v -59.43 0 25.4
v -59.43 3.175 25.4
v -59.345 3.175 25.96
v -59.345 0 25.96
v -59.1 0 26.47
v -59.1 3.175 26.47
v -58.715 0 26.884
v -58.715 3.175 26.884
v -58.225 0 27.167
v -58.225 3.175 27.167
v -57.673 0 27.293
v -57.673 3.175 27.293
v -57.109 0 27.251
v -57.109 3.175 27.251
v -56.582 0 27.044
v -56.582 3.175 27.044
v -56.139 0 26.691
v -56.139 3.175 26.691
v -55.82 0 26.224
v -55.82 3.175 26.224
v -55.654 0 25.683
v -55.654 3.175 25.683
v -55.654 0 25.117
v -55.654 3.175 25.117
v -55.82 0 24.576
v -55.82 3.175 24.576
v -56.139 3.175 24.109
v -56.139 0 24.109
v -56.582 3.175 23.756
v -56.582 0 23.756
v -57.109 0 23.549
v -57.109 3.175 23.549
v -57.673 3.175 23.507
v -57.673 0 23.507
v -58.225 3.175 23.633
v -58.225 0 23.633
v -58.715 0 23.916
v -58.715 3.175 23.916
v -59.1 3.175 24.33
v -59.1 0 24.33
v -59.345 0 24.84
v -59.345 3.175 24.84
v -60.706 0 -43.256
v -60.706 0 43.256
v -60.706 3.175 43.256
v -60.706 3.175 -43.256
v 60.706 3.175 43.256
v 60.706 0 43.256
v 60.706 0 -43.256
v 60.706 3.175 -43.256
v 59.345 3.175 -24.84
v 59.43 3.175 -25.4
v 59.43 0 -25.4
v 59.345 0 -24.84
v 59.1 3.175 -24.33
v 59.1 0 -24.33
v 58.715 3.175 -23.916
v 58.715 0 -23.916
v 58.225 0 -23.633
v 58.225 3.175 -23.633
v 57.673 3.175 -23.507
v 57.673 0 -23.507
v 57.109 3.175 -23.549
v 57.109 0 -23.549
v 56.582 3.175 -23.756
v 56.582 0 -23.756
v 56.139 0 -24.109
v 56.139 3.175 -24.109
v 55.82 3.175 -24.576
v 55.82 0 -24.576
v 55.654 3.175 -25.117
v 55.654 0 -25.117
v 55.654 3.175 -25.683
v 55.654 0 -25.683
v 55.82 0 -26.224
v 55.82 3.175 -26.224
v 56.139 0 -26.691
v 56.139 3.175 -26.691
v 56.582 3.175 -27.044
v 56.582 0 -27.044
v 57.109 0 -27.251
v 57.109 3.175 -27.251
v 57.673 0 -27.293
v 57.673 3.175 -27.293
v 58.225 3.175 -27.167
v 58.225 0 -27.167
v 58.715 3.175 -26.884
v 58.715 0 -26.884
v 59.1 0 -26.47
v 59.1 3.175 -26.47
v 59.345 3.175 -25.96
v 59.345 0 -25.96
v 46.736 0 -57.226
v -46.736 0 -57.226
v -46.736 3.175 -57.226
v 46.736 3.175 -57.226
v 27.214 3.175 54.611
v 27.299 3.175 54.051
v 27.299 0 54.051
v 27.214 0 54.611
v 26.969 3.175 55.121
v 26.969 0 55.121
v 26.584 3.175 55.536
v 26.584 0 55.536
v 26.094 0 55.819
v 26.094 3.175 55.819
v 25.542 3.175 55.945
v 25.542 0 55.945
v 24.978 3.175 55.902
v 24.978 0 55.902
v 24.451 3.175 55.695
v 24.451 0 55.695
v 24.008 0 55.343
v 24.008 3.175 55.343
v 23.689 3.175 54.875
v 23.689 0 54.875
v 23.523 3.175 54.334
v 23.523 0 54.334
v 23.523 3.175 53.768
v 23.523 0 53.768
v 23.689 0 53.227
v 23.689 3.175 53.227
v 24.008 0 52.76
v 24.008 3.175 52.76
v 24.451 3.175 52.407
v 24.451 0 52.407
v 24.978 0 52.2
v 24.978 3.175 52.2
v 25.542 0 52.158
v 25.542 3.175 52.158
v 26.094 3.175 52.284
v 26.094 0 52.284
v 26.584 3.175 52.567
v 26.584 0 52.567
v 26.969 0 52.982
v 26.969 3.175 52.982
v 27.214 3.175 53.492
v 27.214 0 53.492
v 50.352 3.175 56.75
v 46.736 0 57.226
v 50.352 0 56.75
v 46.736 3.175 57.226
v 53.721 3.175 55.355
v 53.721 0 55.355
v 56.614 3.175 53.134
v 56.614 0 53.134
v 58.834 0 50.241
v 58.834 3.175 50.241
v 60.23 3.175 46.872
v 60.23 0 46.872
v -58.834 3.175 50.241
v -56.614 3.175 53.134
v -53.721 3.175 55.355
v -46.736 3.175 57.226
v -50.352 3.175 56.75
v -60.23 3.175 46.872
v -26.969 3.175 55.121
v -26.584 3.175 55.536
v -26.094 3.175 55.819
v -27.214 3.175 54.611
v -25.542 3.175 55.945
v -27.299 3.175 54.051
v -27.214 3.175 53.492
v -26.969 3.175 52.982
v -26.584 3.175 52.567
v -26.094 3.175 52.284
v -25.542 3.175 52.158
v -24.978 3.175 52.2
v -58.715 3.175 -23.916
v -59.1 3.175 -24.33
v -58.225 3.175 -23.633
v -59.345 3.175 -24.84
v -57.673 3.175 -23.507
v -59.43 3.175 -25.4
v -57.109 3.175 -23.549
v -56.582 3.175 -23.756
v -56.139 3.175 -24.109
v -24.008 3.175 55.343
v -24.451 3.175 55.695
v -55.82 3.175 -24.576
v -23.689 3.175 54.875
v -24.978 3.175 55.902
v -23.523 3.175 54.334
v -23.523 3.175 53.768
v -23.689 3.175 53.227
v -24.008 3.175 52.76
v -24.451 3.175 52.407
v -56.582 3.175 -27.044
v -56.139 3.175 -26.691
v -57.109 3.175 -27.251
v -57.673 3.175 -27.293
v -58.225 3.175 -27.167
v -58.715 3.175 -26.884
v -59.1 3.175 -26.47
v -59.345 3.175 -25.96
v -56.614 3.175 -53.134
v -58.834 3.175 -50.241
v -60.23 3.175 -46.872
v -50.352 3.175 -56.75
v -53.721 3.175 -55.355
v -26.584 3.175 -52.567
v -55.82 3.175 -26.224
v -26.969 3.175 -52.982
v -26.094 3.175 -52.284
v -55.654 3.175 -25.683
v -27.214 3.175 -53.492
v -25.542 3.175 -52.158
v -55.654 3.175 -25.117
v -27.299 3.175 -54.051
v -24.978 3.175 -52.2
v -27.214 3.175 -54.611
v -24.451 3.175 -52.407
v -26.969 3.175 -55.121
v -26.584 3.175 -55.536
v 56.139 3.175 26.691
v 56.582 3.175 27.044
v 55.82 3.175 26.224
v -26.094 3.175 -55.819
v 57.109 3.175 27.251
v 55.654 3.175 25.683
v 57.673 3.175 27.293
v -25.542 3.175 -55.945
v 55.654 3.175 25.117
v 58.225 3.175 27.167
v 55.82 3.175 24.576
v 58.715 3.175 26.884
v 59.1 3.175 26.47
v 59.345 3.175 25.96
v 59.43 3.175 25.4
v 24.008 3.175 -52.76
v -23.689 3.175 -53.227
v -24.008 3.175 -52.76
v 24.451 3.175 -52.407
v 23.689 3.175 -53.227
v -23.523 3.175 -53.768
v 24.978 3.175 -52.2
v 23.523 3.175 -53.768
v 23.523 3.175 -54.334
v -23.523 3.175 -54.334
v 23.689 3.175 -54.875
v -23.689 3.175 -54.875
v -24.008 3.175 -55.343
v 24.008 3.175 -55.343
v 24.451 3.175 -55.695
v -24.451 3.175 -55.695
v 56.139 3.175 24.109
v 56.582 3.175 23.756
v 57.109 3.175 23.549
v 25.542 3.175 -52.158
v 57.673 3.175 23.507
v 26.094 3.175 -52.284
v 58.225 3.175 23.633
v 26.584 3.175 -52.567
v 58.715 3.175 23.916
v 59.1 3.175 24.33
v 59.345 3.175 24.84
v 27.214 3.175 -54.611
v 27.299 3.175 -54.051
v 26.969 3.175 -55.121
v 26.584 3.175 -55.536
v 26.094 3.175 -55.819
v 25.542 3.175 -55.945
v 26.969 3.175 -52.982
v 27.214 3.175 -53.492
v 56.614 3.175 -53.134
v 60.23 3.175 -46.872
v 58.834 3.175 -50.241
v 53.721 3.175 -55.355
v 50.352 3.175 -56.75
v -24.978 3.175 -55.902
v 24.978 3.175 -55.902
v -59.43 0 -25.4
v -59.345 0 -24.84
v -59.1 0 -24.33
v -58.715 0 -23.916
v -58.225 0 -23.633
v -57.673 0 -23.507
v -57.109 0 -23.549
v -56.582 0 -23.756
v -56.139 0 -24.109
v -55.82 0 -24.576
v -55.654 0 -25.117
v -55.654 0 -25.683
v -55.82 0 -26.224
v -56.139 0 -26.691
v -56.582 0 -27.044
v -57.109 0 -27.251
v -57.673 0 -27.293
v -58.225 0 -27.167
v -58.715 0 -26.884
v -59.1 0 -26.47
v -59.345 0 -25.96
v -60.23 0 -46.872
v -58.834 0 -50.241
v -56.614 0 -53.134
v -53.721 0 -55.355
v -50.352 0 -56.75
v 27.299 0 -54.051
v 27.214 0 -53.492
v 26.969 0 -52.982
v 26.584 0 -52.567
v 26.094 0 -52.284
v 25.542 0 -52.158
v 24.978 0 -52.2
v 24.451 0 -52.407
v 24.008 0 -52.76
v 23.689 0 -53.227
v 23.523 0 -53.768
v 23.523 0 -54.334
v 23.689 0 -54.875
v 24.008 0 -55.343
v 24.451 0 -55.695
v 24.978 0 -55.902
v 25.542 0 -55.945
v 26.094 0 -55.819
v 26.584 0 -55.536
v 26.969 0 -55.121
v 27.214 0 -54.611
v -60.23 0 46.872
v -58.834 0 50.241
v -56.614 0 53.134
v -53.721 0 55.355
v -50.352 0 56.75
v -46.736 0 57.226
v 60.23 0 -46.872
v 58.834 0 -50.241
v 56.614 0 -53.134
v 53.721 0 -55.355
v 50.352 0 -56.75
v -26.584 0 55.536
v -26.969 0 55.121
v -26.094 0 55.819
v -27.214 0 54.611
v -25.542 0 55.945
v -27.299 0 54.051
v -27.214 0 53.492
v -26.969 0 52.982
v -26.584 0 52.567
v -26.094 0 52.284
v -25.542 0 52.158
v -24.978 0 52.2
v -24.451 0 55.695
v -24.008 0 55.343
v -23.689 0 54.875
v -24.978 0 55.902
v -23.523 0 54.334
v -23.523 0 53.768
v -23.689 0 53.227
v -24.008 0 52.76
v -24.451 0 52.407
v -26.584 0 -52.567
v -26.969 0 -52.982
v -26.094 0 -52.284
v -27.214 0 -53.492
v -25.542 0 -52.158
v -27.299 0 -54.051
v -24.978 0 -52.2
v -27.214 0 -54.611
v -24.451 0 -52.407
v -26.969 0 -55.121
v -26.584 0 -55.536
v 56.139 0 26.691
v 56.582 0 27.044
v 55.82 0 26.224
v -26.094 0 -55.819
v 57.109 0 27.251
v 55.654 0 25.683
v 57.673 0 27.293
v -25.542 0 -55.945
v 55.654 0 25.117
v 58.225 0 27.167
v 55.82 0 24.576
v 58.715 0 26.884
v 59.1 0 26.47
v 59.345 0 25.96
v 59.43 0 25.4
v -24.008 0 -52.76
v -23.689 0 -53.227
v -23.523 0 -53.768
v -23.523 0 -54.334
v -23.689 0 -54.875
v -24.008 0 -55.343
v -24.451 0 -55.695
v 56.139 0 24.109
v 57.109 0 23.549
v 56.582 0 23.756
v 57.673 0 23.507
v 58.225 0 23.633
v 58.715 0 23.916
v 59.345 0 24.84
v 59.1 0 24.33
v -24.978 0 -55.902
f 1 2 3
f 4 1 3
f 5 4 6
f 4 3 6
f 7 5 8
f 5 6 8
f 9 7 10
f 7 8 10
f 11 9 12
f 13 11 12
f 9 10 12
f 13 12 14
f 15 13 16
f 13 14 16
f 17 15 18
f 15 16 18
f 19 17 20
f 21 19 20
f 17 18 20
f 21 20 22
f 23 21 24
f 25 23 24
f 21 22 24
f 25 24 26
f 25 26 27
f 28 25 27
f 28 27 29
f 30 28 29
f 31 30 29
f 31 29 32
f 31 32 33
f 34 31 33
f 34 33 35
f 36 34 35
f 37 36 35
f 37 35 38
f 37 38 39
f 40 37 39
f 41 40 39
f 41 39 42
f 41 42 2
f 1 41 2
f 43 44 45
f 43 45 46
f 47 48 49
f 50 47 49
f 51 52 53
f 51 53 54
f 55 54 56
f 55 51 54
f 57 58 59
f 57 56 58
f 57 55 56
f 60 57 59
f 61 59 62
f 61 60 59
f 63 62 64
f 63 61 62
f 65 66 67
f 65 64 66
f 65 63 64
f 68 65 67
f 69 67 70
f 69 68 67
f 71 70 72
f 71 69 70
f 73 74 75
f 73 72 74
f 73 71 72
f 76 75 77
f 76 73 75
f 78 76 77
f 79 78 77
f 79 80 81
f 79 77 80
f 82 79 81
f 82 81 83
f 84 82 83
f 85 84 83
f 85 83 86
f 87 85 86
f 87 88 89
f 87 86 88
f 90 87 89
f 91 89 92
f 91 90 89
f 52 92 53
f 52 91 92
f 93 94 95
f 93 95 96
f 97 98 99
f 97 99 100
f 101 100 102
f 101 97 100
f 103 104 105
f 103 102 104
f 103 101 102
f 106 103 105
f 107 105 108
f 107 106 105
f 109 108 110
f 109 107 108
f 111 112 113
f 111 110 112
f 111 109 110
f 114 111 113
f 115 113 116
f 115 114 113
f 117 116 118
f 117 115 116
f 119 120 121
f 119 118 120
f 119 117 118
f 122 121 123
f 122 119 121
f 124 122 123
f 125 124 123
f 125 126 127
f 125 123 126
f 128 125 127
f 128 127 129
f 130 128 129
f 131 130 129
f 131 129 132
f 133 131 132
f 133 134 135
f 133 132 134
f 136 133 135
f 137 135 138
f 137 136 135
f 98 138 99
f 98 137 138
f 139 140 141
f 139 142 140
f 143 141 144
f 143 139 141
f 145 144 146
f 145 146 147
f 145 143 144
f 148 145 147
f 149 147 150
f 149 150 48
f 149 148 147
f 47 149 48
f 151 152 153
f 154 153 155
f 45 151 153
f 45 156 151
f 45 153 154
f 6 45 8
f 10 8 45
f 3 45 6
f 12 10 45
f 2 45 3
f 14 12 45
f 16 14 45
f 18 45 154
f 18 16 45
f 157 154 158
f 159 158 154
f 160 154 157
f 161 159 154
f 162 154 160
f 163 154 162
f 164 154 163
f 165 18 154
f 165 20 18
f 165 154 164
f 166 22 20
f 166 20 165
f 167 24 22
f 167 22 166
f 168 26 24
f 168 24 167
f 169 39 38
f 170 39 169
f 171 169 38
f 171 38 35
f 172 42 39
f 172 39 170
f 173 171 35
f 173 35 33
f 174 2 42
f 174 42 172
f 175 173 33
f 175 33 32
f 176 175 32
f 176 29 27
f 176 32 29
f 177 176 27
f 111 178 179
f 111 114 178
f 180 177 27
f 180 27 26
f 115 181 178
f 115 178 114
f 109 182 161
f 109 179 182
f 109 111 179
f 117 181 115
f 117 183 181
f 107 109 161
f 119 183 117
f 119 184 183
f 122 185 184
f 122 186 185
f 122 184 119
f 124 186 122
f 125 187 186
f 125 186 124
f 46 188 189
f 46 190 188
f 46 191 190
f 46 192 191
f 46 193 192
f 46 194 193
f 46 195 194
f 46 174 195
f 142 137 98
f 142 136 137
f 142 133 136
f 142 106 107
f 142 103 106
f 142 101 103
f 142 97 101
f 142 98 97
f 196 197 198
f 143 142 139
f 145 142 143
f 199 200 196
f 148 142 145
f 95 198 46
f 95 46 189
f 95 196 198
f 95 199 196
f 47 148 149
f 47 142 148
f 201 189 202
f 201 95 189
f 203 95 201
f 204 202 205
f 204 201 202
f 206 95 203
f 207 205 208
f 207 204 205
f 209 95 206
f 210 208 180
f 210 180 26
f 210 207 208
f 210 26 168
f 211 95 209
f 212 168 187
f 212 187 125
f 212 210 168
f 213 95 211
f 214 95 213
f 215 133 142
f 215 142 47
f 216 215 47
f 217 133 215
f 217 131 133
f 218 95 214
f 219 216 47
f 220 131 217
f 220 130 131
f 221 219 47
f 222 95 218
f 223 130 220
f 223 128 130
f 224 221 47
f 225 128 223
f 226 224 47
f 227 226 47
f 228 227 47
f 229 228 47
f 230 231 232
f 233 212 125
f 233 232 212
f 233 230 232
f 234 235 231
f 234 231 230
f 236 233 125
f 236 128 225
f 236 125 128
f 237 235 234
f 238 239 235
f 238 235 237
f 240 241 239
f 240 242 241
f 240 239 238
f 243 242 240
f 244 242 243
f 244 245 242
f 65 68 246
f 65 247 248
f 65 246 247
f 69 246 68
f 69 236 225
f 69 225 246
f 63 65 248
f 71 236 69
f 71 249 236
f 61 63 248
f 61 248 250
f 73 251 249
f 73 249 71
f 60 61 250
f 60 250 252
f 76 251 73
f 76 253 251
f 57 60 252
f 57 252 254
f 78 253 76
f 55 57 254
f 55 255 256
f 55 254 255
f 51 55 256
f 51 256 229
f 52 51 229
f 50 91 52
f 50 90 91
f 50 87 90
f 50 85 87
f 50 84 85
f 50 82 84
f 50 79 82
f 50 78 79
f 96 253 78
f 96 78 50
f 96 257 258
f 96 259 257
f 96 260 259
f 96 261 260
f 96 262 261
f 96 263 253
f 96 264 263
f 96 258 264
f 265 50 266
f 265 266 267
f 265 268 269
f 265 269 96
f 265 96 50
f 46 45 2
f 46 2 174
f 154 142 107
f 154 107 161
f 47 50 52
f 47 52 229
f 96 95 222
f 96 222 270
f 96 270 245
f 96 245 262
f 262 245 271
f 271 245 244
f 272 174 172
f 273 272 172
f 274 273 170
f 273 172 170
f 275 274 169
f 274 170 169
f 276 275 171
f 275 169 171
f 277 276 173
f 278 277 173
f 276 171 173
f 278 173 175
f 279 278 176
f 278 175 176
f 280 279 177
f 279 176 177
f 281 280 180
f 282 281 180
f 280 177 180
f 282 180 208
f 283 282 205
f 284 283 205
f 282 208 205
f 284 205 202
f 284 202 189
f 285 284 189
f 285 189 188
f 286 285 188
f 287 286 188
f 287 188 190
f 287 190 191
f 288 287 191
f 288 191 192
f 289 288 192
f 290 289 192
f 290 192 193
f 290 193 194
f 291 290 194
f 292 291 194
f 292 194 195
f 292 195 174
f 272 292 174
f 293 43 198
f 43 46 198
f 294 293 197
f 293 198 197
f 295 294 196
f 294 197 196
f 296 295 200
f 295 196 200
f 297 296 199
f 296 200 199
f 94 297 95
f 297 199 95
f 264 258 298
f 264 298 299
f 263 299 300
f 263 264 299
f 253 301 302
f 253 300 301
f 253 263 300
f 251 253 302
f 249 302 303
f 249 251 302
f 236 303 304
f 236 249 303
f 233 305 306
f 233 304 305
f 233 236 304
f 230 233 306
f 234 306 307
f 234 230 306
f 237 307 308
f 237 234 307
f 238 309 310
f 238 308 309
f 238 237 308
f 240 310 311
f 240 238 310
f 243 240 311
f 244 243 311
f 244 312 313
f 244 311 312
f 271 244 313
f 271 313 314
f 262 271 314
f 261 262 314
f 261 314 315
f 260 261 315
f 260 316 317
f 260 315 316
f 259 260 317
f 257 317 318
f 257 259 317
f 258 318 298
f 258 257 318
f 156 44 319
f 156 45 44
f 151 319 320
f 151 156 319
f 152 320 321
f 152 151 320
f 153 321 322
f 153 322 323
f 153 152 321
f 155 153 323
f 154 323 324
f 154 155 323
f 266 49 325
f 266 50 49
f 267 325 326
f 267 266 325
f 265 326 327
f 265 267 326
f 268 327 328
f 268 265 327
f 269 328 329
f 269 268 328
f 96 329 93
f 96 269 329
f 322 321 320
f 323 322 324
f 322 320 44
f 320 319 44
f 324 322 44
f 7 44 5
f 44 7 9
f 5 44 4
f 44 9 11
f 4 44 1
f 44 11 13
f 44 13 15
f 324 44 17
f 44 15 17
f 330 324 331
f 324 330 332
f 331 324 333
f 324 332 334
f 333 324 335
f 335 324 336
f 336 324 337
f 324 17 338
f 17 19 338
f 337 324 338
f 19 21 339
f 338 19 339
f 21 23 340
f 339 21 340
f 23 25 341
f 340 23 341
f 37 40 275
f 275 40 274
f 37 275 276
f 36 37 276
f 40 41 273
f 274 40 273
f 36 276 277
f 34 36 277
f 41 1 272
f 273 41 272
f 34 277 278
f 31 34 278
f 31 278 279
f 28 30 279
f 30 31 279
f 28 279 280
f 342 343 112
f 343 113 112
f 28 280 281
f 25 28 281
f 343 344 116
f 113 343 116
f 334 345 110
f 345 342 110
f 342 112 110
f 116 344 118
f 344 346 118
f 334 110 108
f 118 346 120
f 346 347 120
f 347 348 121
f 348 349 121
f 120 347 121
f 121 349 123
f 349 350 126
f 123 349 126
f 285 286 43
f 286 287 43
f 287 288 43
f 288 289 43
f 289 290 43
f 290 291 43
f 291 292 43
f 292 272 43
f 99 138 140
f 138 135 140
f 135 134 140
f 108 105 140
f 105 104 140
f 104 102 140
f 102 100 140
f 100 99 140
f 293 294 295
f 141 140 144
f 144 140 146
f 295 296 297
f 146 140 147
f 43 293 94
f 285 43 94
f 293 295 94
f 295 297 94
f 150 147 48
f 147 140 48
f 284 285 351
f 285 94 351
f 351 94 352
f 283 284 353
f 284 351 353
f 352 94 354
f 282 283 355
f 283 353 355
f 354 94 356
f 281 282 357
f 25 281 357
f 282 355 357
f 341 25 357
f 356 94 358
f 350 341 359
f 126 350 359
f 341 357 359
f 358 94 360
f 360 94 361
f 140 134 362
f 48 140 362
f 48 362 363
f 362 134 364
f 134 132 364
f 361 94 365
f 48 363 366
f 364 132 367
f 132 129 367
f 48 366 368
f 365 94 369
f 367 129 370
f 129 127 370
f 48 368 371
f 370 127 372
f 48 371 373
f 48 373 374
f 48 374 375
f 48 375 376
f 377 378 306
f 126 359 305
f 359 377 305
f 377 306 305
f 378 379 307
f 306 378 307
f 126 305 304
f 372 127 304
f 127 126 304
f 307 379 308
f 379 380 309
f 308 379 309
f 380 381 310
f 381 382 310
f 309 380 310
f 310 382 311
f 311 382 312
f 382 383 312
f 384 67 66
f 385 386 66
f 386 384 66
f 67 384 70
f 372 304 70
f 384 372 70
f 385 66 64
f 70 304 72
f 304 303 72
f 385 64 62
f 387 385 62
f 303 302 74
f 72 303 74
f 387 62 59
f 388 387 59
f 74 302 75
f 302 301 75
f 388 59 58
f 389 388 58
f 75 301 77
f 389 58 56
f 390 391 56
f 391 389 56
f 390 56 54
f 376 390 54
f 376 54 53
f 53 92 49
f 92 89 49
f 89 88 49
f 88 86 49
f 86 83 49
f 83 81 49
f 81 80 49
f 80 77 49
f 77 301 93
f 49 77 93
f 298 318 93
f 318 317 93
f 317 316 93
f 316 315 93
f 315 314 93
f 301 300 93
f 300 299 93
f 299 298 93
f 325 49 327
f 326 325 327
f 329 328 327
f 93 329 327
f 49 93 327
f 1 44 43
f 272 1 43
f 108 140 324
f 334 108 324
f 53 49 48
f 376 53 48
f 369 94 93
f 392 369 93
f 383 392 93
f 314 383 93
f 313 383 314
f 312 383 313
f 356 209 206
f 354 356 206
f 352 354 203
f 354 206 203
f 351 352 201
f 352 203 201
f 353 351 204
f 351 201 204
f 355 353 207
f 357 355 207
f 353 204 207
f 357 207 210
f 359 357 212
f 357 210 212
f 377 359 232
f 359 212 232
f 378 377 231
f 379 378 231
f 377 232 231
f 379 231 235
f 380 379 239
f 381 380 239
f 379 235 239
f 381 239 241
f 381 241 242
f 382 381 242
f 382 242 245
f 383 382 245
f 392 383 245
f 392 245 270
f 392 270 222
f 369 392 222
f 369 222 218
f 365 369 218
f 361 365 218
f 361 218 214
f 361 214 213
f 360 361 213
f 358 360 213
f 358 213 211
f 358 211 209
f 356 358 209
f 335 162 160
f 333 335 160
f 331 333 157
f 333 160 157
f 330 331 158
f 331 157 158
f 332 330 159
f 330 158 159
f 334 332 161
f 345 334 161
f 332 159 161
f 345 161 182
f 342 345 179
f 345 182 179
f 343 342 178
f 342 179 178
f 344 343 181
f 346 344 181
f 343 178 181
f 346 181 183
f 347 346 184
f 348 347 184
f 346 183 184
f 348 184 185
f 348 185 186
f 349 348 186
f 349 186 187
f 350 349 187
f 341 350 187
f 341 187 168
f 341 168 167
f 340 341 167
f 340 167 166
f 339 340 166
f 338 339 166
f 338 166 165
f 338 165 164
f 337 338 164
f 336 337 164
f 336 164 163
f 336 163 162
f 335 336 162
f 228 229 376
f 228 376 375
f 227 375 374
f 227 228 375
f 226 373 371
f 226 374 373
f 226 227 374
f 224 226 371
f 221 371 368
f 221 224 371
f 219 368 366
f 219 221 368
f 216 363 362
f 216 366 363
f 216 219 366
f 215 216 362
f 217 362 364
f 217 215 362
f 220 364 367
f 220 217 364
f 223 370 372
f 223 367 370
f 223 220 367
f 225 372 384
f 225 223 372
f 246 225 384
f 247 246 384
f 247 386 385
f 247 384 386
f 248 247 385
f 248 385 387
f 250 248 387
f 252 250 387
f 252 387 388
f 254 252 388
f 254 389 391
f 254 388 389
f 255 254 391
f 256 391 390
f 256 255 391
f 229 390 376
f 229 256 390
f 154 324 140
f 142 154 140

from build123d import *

# Parameters (mm, degrees)
SKETCH1_W             = 121.412
SKETCH1_H             = 114.4524
BOSS_EXTRUDE1_DEPTH   = 3.175
FILLET2_R             = 13.97
F_6_CLEARANCE_HOLE1_D = 3.7973


with BuildPart() as part:
    # Sketch1 → Boss-Extrude1 (new body)
    with BuildSketch(Plane(origin=(0, 0, 0), x_dir=(1, 0, 0), z_dir=(0, 1, 0))):
        Rectangle(SKETCH1_W, SKETCH1_H)
    extrude(amount=BOSS_EXTRUDE1_DEPTH)

    # Fillet2
    fillet2_edges = [part.edges().sort_by_distance(p)[0] for p in [
        (-60.706, 1.5875, -57.2262),
        (60.706, 1.5875, -57.2262),
        (60.706, 1.5875, 57.2262),
        (-60.706, 1.5875, 57.2262),
    ]]
    fillet(fillet2_edges, radius=FILLET2_R)

    # #6 Clearance Hole1 (through all)
    with Locations(Plane.XZ):
        with Locations((-25.4, 54.0512), (-25.4, -54.0512), (-57.531, -25.4), (-57.531, 25.4)):
            f_6_clearance_hole1 = Hole(F_6_CLEARANCE_HOLE1_D / 2)

    # Mirror1: #6 Clearance Hole1 across plane
    add(f_6_clearance_hole1.mirror(Plane(origin=(0, 0, 0), x_dir=(0, 0, 1), z_dir=(1, 0, 0))), mode=Mode.SUBTRACT)


solid = part.part
